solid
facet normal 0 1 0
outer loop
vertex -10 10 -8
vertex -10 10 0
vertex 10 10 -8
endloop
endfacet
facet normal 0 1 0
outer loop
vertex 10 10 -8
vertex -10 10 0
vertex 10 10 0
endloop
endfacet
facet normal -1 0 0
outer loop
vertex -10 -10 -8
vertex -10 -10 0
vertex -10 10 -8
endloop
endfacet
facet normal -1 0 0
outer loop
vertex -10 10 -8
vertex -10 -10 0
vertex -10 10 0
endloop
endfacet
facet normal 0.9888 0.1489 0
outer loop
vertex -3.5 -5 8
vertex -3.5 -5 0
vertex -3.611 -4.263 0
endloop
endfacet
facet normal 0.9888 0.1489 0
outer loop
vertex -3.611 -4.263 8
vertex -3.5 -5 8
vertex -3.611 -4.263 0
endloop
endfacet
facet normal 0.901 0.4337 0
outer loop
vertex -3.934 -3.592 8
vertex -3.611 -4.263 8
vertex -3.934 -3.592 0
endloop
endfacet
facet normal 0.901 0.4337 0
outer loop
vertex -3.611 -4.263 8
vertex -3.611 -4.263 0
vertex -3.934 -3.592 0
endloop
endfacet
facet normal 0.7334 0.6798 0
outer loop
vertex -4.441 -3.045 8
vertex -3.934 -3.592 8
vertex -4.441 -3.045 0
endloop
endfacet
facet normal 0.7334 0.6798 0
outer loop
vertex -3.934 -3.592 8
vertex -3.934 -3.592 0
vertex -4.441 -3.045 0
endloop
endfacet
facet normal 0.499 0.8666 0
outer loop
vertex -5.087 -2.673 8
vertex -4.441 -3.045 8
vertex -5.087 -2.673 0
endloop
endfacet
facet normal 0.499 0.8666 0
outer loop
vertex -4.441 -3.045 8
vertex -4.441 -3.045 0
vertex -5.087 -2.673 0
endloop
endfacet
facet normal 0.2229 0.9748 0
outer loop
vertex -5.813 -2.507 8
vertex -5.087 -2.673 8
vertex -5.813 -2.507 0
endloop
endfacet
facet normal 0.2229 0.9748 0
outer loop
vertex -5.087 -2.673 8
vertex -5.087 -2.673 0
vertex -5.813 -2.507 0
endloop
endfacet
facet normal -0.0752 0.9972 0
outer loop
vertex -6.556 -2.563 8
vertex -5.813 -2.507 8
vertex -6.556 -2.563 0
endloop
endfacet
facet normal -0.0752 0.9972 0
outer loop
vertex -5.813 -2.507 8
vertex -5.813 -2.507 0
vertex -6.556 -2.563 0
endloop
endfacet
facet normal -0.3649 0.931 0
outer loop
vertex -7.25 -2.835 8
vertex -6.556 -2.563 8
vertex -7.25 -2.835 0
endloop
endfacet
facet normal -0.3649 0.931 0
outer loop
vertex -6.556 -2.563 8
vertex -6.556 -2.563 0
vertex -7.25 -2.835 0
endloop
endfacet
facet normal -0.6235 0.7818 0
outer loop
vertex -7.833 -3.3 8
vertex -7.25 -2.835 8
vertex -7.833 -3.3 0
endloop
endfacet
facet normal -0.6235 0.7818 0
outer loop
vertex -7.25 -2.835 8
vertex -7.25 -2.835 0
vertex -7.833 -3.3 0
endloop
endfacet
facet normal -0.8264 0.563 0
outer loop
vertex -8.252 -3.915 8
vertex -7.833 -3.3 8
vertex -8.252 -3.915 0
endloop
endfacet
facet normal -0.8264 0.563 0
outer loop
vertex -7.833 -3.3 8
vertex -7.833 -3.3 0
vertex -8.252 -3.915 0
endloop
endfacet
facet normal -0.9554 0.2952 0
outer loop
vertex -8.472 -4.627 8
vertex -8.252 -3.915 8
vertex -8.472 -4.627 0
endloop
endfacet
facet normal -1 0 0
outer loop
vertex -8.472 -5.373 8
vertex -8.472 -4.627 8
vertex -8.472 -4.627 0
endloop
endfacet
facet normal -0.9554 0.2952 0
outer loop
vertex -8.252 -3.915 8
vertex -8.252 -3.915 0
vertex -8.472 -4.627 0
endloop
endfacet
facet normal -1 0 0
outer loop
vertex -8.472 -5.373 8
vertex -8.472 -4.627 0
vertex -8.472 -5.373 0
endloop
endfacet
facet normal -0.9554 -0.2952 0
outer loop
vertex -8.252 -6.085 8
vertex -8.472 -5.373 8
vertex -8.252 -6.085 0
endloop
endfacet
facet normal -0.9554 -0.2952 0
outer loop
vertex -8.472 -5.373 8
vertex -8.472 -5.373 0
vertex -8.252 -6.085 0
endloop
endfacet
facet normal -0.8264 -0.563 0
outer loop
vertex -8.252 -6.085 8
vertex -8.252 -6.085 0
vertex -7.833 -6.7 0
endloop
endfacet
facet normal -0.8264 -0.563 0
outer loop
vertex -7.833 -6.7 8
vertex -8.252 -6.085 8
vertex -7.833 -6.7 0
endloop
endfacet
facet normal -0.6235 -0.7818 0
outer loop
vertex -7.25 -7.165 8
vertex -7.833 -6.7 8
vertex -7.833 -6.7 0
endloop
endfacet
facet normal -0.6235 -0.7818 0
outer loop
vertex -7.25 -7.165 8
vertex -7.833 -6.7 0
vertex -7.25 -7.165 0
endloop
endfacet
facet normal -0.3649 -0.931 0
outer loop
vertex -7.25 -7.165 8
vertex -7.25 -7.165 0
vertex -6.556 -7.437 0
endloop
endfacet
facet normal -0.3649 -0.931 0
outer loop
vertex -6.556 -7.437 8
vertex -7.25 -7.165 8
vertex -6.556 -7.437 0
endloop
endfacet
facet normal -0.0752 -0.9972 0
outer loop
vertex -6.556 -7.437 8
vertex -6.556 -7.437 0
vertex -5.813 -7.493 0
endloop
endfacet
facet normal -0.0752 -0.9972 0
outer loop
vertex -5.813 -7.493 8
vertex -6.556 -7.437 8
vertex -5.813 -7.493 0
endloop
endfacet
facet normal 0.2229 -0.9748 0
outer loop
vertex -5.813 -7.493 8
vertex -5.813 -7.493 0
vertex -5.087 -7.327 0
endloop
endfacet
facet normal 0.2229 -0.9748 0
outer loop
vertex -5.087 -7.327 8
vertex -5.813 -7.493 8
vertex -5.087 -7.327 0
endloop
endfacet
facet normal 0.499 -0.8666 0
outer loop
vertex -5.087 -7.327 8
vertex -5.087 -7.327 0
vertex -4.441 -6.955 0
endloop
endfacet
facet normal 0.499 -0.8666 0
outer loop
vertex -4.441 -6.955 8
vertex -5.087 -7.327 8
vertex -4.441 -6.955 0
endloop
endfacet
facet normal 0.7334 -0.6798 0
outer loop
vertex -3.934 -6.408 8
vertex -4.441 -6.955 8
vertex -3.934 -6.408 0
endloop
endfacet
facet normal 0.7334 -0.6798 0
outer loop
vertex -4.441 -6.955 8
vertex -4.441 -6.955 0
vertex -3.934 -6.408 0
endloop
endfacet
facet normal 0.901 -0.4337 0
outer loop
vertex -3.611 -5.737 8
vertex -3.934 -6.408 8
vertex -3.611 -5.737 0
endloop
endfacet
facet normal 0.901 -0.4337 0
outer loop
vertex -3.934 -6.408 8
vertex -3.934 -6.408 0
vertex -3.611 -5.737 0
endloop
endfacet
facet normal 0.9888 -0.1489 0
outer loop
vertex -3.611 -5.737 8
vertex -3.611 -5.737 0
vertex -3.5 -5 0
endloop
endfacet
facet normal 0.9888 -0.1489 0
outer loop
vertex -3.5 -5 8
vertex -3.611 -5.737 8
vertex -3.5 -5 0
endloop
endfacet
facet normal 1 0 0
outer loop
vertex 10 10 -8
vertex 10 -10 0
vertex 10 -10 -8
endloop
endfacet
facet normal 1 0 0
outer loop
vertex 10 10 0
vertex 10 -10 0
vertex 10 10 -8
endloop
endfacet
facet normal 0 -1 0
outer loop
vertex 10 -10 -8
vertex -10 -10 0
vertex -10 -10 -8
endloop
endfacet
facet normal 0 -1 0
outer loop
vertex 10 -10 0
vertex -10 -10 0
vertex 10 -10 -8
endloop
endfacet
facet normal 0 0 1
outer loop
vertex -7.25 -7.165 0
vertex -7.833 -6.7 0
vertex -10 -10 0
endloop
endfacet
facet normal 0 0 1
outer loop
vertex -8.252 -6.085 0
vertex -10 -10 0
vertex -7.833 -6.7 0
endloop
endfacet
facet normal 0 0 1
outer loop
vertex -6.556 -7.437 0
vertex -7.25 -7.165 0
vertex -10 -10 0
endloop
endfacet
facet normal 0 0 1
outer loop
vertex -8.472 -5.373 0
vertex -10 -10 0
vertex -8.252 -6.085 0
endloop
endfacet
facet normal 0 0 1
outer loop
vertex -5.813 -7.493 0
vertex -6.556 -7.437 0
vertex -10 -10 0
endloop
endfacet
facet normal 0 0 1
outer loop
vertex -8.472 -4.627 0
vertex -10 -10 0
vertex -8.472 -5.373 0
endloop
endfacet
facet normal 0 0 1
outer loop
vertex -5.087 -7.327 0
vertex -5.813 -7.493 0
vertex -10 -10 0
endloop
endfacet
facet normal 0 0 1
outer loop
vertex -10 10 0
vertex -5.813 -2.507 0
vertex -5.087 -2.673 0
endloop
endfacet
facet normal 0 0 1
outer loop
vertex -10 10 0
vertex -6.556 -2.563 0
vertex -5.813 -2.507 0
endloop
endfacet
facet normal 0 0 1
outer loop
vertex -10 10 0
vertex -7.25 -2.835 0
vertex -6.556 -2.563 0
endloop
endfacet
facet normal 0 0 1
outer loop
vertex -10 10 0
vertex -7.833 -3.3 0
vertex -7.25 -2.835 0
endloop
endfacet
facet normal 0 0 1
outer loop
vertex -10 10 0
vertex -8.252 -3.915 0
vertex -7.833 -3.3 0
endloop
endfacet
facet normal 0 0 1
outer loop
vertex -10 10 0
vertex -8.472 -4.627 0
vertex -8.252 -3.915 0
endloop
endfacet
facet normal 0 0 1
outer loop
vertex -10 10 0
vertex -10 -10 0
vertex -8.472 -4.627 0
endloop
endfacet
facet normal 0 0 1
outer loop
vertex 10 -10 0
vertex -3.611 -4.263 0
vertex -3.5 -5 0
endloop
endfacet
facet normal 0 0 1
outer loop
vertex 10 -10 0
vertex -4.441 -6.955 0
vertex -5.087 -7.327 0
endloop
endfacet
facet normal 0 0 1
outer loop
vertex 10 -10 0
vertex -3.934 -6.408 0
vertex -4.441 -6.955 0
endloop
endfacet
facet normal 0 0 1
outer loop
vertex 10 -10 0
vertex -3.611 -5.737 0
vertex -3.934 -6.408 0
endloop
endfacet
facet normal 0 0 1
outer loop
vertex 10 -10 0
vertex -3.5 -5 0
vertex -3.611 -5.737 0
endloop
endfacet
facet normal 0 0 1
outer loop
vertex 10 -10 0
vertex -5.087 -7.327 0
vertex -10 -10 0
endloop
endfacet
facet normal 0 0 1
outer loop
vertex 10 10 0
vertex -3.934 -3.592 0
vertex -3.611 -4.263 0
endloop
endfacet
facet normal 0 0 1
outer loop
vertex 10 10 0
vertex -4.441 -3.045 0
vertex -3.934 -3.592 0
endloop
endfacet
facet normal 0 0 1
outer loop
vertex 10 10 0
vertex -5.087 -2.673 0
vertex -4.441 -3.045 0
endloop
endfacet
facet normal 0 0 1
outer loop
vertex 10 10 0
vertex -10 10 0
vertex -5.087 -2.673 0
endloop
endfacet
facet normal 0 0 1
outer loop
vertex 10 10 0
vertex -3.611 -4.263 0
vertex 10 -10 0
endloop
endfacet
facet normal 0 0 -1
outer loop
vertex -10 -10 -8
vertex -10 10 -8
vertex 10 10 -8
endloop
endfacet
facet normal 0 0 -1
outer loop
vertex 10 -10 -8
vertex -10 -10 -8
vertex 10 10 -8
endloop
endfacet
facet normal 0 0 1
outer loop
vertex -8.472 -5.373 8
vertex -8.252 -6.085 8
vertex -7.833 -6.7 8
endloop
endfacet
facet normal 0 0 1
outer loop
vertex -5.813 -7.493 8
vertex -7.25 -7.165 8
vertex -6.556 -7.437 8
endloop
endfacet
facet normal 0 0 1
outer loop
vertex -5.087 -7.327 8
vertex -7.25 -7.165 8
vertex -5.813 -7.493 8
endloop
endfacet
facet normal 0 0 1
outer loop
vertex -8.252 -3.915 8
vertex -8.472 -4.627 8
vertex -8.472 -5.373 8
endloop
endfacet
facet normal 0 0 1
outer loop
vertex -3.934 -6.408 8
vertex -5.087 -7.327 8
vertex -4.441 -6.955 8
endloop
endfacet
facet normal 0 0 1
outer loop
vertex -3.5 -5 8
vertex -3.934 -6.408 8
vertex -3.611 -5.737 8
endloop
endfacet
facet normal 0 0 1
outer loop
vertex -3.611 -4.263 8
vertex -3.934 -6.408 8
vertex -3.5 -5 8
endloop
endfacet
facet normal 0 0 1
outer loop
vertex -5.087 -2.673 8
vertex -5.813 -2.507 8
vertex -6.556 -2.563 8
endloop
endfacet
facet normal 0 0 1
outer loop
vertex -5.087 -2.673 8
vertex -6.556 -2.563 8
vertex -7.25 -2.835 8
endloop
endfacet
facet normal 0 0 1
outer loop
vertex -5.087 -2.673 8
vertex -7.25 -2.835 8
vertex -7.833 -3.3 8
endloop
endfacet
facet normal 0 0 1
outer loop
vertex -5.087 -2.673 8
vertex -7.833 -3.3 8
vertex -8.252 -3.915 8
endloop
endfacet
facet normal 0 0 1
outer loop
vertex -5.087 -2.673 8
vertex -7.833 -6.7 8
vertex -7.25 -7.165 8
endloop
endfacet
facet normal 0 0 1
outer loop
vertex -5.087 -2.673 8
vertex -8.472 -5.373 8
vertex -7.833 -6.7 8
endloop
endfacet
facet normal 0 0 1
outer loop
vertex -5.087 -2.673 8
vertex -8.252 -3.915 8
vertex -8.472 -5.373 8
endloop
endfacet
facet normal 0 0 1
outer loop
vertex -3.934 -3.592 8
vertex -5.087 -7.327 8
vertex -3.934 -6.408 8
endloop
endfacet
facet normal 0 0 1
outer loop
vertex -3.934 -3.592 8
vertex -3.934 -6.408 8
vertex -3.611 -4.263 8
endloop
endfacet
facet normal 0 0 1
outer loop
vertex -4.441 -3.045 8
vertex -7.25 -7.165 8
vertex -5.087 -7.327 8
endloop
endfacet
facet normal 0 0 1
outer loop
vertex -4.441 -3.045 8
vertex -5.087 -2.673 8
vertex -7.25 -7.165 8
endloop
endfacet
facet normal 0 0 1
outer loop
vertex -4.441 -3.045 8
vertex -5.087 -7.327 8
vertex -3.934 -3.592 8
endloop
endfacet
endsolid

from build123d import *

# Parameters (mm, degrees)
F1_R     = 2.5
F2_DEPTH = 8
F0_W     = 20
F0_H     = 20
F3_DEPTH = 8


with BuildPart() as f2:
    # F1 (on face) → F2 (new body)
    with BuildSketch(Plane.XY):
        with Locations((-6, -5)):
            Circle(F1_R)
    extrude(amount=F2_DEPTH)

    # F0 (on Top) → F3 (join)
    with BuildSketch(Plane.XY):
        Rectangle(F0_W, F0_H)
    extrude(amount=-F3_DEPTH)


solid = f2.part
